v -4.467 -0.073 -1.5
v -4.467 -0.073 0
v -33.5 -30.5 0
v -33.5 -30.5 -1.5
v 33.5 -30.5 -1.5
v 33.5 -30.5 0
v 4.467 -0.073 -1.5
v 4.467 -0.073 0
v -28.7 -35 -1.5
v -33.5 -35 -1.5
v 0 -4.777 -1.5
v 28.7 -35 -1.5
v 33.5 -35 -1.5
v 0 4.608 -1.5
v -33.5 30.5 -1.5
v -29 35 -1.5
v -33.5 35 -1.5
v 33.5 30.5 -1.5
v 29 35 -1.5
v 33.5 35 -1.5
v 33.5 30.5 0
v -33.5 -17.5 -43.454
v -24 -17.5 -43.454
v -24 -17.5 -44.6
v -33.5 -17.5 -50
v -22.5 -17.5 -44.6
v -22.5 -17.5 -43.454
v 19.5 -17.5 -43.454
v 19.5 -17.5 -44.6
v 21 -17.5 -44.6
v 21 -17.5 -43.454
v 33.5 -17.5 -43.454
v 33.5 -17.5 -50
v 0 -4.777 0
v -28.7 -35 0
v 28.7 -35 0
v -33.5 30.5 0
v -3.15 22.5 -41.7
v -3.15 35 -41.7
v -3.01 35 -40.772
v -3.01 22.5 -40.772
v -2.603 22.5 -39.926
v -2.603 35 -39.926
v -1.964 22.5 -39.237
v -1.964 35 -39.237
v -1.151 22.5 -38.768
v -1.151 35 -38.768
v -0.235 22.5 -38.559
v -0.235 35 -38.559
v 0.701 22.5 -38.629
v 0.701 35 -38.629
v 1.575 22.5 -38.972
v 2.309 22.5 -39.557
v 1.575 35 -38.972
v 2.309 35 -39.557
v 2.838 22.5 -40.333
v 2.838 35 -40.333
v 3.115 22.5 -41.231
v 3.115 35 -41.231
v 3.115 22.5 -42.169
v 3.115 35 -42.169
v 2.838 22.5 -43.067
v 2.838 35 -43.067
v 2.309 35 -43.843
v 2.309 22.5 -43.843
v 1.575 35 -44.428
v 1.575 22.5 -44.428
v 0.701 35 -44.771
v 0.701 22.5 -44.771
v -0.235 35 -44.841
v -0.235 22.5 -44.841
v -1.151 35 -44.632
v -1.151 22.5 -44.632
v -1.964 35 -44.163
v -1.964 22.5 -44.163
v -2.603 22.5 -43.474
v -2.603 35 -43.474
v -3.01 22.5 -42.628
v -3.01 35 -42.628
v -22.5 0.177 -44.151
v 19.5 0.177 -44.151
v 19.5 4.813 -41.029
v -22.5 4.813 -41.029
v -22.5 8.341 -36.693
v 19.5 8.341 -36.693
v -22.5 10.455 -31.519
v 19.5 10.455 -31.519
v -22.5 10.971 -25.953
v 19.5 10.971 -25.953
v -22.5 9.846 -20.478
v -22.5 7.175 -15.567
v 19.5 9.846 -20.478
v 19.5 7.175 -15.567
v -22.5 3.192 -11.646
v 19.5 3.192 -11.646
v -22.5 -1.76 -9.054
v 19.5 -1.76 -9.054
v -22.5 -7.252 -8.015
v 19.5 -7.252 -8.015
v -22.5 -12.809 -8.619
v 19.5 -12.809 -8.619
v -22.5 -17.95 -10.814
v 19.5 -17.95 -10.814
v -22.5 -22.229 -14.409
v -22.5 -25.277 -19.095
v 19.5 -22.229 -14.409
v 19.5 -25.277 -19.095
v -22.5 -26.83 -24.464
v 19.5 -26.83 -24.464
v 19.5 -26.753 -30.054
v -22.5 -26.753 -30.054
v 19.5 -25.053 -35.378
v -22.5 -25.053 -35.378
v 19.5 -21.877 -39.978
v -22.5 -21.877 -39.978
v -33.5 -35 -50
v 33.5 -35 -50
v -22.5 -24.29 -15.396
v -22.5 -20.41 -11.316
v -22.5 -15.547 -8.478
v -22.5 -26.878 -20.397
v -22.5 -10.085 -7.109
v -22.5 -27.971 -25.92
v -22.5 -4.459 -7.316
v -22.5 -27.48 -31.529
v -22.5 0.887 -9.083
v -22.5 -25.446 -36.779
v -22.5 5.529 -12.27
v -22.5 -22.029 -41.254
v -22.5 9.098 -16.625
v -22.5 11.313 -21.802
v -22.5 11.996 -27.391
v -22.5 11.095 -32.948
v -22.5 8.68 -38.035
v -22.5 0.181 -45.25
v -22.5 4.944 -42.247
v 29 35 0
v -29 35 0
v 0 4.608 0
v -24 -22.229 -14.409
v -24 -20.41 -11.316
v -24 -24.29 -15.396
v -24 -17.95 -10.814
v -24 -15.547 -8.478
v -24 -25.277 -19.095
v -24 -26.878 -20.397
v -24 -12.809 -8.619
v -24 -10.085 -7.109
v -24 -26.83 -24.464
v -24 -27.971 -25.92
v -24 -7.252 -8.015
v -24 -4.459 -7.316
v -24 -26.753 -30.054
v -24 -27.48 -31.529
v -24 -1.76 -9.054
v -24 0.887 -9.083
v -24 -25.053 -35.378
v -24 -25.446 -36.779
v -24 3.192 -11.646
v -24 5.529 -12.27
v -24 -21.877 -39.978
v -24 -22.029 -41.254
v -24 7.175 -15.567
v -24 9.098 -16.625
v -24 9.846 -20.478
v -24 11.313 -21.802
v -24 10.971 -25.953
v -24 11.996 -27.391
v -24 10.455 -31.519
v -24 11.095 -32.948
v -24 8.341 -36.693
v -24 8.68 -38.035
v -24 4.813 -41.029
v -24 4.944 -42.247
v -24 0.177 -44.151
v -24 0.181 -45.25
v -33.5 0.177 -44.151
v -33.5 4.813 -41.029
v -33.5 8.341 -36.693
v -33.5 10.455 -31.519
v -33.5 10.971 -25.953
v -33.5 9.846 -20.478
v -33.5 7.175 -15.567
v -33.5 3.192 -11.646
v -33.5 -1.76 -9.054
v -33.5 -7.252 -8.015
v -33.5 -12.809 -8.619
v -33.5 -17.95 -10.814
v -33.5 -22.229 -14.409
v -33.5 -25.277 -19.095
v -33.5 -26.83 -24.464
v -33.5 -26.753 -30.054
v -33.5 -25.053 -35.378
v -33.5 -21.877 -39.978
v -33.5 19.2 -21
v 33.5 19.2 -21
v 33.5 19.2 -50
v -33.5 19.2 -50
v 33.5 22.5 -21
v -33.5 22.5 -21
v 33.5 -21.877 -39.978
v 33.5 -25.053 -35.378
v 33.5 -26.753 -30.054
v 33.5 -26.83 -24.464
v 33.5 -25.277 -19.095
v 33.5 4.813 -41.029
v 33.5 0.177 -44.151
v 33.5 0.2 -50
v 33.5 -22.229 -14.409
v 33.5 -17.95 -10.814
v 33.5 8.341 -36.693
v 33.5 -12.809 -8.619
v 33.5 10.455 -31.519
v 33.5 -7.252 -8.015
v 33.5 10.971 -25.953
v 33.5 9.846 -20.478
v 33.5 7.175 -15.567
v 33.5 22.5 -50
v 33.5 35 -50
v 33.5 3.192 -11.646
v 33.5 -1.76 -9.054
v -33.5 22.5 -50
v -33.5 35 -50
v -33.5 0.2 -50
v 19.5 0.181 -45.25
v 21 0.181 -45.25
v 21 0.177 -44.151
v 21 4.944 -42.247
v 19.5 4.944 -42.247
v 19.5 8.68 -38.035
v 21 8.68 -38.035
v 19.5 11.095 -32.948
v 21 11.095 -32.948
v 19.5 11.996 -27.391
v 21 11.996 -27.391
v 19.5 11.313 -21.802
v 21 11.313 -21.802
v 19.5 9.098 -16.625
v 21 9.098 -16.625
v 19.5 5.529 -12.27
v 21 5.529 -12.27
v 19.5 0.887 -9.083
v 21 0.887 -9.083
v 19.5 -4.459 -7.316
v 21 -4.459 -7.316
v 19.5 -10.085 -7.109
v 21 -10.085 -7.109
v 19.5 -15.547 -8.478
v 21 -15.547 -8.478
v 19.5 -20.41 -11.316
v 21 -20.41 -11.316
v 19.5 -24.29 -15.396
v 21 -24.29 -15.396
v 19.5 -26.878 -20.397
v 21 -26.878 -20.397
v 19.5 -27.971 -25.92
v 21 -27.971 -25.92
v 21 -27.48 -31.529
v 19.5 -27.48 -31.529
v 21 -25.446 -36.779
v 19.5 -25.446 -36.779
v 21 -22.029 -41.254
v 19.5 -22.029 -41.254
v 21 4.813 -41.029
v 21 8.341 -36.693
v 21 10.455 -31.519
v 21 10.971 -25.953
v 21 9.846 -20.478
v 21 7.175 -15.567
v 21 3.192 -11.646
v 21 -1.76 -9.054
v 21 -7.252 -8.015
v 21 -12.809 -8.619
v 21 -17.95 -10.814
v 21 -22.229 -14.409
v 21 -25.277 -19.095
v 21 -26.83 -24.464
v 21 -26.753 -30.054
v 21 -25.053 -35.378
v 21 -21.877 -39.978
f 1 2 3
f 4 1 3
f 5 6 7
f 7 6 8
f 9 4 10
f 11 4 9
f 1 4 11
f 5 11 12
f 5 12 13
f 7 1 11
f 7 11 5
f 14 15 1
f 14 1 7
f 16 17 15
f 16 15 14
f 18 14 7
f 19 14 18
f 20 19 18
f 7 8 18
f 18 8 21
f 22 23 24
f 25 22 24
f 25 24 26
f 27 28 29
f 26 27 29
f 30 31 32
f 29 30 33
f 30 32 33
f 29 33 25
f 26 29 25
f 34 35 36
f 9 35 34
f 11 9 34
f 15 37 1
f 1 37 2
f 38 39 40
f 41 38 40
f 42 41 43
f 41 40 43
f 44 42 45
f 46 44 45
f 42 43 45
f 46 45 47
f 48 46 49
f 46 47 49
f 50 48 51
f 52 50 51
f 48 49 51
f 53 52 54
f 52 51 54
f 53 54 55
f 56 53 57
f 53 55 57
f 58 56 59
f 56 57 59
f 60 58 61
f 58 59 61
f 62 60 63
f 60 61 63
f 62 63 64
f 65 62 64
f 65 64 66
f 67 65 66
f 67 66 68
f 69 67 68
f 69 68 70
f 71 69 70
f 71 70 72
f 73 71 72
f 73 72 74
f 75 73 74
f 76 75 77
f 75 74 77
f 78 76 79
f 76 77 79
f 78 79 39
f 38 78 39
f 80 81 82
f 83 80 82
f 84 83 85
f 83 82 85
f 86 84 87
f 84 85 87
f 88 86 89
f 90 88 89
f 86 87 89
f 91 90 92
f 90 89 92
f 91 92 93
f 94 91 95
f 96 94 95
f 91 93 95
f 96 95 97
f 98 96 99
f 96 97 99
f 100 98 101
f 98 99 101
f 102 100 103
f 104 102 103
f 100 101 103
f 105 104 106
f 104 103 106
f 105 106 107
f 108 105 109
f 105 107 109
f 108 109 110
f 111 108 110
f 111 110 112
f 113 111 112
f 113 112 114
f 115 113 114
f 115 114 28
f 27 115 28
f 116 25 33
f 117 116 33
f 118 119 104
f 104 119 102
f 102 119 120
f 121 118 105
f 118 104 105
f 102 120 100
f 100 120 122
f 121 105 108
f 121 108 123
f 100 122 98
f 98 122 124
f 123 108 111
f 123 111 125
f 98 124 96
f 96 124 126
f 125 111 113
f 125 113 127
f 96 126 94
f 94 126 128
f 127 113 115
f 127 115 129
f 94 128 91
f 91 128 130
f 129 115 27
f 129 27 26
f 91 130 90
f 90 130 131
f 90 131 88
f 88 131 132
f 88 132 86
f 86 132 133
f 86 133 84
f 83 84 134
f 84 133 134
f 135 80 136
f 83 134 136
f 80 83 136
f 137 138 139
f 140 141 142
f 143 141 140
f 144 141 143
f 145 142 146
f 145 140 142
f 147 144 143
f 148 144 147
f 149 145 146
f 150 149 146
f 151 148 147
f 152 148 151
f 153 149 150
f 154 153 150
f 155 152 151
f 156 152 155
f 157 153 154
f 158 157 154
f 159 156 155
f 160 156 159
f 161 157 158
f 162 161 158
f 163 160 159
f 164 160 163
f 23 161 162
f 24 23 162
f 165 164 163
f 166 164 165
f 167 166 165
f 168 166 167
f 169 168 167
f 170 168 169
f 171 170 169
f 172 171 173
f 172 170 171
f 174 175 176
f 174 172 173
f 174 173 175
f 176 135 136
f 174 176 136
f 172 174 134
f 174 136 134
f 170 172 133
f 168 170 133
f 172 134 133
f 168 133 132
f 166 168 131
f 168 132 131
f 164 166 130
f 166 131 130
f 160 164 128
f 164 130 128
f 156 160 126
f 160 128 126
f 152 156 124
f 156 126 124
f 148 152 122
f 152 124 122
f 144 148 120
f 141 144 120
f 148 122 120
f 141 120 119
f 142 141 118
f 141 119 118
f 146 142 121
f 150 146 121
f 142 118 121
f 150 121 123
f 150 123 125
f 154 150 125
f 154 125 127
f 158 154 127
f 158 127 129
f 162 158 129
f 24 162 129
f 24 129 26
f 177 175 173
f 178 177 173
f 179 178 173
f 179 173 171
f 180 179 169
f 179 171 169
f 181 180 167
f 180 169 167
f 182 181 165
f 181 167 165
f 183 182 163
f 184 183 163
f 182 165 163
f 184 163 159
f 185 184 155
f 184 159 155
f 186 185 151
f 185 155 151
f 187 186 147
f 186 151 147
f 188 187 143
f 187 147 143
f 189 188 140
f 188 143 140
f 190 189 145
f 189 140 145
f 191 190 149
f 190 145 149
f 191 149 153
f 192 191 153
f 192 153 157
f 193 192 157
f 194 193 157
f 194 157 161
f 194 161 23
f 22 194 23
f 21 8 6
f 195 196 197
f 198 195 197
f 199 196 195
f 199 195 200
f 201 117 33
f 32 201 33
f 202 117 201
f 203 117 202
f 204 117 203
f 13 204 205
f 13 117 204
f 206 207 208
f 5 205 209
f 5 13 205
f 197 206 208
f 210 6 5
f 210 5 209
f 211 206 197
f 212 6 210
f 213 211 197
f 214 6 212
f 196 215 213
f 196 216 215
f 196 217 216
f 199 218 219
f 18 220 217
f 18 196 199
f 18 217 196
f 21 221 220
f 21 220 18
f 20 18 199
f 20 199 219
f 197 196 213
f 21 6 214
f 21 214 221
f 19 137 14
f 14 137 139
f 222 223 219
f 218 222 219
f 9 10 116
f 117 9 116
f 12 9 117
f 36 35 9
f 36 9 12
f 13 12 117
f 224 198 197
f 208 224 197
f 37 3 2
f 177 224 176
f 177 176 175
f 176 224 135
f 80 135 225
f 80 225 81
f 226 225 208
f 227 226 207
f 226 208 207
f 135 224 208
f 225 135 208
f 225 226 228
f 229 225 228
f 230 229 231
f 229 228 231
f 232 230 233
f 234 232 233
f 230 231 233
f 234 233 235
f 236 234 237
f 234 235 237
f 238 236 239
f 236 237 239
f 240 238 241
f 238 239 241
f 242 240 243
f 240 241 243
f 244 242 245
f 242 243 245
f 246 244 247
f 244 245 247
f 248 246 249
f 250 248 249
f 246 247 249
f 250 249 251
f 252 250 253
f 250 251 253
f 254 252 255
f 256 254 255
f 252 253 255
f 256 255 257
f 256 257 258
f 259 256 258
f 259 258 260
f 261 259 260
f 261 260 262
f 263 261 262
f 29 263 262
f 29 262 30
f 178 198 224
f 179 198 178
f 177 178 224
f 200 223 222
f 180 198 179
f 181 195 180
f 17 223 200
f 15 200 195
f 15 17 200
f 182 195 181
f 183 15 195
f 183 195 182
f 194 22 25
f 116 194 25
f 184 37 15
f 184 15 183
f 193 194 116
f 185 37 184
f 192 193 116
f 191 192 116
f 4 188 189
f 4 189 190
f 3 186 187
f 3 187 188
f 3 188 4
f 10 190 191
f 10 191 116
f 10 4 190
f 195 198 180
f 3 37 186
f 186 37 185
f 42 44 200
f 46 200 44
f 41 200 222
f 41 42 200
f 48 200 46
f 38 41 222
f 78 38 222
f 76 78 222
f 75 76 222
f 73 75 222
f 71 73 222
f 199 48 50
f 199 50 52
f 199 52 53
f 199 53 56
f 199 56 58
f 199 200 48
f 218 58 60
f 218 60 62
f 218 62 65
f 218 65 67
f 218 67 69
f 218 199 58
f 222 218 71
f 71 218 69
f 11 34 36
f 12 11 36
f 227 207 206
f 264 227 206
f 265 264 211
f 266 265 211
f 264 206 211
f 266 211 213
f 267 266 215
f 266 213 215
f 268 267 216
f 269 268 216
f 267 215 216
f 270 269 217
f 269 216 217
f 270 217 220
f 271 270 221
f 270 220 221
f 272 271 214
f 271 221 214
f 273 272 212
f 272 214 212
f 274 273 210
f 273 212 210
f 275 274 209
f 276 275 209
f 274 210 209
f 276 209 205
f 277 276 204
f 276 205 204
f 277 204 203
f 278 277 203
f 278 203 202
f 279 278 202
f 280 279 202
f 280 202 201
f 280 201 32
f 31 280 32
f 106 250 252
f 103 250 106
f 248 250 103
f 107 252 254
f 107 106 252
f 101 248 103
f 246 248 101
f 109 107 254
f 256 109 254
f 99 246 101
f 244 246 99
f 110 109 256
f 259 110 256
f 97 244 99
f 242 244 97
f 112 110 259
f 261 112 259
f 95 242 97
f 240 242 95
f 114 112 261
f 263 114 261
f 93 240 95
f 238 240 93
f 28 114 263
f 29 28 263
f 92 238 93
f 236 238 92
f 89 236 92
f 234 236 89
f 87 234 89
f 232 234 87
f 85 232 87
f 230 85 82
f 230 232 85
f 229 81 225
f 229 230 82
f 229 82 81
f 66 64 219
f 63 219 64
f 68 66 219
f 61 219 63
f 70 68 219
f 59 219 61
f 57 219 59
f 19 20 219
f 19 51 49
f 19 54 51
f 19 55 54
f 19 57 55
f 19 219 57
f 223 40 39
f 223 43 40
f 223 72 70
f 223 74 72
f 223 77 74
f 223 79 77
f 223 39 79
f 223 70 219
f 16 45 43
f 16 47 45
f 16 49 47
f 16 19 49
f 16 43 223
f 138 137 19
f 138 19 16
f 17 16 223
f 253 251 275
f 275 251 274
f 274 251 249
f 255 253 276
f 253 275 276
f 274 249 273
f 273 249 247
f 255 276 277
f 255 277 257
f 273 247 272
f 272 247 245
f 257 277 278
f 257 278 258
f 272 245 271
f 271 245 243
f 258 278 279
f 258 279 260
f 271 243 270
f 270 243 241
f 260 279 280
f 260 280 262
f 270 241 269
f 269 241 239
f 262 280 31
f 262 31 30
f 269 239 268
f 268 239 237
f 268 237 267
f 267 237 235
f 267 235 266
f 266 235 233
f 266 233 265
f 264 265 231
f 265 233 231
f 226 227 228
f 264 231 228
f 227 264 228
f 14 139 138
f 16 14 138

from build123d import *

# Parameters (mm, degrees)
SKETCH1_W           = 67
SKETCH1_H           = 70
BOSS_EXTRUDE1_DEPTH = 50
SKETCH5_R           = 3.15
CUT_EXTRUDE2_DEPTH  = 12.5
CUT_EXTRUDE3_DEPTH  = 1.5
SKETCH6_W           = 29
SKETCH6_H           = 3.3
CUT_EXTRUDE4_DEPTH  = 67
SKETCH7_R           = 20
CUT_EXTRUDE5_DEPTH  = 1.5
SKETCH8_R           = 20
CUT_EXTRUDE6_DEPTH  = 1.5


with BuildPart() as part:
    # Sketch1 → Boss-Extrude1 (new body)
    with BuildSketch(Plane.XY):
        Rectangle(SKETCH1_W, SKETCH1_H)
    extrude(amount=-BOSS_EXTRUDE1_DEPTH)

    # Sketch5 → Cut-Extrude2 (cut)
    with BuildSketch(Plane(origin=(0, 35, 0), x_dir=(1, 0, 0), z_dir=(0, 1, 0))):
        with Locations((0, 41.7)):
            Circle(SKETCH5_R)
    extrude(amount=-CUT_EXTRUDE2_DEPTH, mode=Mode.SUBTRACT)

    # Sketch1<4> → Cut-Extrude3 (cut)
    with BuildSketch(Plane.XY):
        Polygon((-4.46696193, -0.073376103), (-33.5, -30.5), (-33.5, -35), (-28.7, -35), (0, -4.77733119), (28.7, -35), (33.5, -35), (33.5, -30.5), (4.46696193, -0.073376103), (33.5, 30.5), (33.5, 35), (29, 35), (0, 4.608), (-29, 35), (-33.5, 35), (-33.5, 30.5), align=None)
    extrude(amount=-CUT_EXTRUDE3_DEPTH, mode=Mode.SUBTRACT)

    # Sketch6 → Cut-Extrude4 (cut)
    with BuildSketch(Plane(origin=(33.5, 0, 0), x_dir=(0, 0, -1), z_dir=(1, 0, 0))):
        with Locations((35.5, 20.85)):
            Rectangle(SKETCH6_W, SKETCH6_H)
        with BuildLine():
            Line((50, 0.2), (44.150602701, 0.176602411))
            ThreePointArc((44.150602701, 0.176602411), (8.01471599, -7.252342947), (43.454482672, -17.5))
            Line((43.454482672, -17.5), (50, -17.5))
            Line((50, -17.5), (50, 0.2))
        make_face()
    extrude(amount=-CUT_EXTRUDE4_DEPTH, mode=Mode.SUBTRACT)

    # Sketch7 → Cut-Extrude5 (cut)
    with BuildSketch(Plane(origin=(21, 0, 0), x_dir=(0, 0, -1), z_dir=(1, 0, 0))):
        with Locations((27, -8)):
            Circle(SKETCH7_R)
    extrude(amount=-CUT_EXTRUDE5_DEPTH, mode=Mode.SUBTRACT)

    # Sketch8 → Cut-Extrude6 (cut)
    with BuildSketch(Plane(origin=(-22.5, 0, 0), x_dir=(0, 0, -1), z_dir=(1, 0, 0))):
        with Locations((27, -8)):
            Circle(SKETCH8_R)
    extrude(amount=-CUT_EXTRUDE6_DEPTH, mode=Mode.SUBTRACT)


solid = part.part
